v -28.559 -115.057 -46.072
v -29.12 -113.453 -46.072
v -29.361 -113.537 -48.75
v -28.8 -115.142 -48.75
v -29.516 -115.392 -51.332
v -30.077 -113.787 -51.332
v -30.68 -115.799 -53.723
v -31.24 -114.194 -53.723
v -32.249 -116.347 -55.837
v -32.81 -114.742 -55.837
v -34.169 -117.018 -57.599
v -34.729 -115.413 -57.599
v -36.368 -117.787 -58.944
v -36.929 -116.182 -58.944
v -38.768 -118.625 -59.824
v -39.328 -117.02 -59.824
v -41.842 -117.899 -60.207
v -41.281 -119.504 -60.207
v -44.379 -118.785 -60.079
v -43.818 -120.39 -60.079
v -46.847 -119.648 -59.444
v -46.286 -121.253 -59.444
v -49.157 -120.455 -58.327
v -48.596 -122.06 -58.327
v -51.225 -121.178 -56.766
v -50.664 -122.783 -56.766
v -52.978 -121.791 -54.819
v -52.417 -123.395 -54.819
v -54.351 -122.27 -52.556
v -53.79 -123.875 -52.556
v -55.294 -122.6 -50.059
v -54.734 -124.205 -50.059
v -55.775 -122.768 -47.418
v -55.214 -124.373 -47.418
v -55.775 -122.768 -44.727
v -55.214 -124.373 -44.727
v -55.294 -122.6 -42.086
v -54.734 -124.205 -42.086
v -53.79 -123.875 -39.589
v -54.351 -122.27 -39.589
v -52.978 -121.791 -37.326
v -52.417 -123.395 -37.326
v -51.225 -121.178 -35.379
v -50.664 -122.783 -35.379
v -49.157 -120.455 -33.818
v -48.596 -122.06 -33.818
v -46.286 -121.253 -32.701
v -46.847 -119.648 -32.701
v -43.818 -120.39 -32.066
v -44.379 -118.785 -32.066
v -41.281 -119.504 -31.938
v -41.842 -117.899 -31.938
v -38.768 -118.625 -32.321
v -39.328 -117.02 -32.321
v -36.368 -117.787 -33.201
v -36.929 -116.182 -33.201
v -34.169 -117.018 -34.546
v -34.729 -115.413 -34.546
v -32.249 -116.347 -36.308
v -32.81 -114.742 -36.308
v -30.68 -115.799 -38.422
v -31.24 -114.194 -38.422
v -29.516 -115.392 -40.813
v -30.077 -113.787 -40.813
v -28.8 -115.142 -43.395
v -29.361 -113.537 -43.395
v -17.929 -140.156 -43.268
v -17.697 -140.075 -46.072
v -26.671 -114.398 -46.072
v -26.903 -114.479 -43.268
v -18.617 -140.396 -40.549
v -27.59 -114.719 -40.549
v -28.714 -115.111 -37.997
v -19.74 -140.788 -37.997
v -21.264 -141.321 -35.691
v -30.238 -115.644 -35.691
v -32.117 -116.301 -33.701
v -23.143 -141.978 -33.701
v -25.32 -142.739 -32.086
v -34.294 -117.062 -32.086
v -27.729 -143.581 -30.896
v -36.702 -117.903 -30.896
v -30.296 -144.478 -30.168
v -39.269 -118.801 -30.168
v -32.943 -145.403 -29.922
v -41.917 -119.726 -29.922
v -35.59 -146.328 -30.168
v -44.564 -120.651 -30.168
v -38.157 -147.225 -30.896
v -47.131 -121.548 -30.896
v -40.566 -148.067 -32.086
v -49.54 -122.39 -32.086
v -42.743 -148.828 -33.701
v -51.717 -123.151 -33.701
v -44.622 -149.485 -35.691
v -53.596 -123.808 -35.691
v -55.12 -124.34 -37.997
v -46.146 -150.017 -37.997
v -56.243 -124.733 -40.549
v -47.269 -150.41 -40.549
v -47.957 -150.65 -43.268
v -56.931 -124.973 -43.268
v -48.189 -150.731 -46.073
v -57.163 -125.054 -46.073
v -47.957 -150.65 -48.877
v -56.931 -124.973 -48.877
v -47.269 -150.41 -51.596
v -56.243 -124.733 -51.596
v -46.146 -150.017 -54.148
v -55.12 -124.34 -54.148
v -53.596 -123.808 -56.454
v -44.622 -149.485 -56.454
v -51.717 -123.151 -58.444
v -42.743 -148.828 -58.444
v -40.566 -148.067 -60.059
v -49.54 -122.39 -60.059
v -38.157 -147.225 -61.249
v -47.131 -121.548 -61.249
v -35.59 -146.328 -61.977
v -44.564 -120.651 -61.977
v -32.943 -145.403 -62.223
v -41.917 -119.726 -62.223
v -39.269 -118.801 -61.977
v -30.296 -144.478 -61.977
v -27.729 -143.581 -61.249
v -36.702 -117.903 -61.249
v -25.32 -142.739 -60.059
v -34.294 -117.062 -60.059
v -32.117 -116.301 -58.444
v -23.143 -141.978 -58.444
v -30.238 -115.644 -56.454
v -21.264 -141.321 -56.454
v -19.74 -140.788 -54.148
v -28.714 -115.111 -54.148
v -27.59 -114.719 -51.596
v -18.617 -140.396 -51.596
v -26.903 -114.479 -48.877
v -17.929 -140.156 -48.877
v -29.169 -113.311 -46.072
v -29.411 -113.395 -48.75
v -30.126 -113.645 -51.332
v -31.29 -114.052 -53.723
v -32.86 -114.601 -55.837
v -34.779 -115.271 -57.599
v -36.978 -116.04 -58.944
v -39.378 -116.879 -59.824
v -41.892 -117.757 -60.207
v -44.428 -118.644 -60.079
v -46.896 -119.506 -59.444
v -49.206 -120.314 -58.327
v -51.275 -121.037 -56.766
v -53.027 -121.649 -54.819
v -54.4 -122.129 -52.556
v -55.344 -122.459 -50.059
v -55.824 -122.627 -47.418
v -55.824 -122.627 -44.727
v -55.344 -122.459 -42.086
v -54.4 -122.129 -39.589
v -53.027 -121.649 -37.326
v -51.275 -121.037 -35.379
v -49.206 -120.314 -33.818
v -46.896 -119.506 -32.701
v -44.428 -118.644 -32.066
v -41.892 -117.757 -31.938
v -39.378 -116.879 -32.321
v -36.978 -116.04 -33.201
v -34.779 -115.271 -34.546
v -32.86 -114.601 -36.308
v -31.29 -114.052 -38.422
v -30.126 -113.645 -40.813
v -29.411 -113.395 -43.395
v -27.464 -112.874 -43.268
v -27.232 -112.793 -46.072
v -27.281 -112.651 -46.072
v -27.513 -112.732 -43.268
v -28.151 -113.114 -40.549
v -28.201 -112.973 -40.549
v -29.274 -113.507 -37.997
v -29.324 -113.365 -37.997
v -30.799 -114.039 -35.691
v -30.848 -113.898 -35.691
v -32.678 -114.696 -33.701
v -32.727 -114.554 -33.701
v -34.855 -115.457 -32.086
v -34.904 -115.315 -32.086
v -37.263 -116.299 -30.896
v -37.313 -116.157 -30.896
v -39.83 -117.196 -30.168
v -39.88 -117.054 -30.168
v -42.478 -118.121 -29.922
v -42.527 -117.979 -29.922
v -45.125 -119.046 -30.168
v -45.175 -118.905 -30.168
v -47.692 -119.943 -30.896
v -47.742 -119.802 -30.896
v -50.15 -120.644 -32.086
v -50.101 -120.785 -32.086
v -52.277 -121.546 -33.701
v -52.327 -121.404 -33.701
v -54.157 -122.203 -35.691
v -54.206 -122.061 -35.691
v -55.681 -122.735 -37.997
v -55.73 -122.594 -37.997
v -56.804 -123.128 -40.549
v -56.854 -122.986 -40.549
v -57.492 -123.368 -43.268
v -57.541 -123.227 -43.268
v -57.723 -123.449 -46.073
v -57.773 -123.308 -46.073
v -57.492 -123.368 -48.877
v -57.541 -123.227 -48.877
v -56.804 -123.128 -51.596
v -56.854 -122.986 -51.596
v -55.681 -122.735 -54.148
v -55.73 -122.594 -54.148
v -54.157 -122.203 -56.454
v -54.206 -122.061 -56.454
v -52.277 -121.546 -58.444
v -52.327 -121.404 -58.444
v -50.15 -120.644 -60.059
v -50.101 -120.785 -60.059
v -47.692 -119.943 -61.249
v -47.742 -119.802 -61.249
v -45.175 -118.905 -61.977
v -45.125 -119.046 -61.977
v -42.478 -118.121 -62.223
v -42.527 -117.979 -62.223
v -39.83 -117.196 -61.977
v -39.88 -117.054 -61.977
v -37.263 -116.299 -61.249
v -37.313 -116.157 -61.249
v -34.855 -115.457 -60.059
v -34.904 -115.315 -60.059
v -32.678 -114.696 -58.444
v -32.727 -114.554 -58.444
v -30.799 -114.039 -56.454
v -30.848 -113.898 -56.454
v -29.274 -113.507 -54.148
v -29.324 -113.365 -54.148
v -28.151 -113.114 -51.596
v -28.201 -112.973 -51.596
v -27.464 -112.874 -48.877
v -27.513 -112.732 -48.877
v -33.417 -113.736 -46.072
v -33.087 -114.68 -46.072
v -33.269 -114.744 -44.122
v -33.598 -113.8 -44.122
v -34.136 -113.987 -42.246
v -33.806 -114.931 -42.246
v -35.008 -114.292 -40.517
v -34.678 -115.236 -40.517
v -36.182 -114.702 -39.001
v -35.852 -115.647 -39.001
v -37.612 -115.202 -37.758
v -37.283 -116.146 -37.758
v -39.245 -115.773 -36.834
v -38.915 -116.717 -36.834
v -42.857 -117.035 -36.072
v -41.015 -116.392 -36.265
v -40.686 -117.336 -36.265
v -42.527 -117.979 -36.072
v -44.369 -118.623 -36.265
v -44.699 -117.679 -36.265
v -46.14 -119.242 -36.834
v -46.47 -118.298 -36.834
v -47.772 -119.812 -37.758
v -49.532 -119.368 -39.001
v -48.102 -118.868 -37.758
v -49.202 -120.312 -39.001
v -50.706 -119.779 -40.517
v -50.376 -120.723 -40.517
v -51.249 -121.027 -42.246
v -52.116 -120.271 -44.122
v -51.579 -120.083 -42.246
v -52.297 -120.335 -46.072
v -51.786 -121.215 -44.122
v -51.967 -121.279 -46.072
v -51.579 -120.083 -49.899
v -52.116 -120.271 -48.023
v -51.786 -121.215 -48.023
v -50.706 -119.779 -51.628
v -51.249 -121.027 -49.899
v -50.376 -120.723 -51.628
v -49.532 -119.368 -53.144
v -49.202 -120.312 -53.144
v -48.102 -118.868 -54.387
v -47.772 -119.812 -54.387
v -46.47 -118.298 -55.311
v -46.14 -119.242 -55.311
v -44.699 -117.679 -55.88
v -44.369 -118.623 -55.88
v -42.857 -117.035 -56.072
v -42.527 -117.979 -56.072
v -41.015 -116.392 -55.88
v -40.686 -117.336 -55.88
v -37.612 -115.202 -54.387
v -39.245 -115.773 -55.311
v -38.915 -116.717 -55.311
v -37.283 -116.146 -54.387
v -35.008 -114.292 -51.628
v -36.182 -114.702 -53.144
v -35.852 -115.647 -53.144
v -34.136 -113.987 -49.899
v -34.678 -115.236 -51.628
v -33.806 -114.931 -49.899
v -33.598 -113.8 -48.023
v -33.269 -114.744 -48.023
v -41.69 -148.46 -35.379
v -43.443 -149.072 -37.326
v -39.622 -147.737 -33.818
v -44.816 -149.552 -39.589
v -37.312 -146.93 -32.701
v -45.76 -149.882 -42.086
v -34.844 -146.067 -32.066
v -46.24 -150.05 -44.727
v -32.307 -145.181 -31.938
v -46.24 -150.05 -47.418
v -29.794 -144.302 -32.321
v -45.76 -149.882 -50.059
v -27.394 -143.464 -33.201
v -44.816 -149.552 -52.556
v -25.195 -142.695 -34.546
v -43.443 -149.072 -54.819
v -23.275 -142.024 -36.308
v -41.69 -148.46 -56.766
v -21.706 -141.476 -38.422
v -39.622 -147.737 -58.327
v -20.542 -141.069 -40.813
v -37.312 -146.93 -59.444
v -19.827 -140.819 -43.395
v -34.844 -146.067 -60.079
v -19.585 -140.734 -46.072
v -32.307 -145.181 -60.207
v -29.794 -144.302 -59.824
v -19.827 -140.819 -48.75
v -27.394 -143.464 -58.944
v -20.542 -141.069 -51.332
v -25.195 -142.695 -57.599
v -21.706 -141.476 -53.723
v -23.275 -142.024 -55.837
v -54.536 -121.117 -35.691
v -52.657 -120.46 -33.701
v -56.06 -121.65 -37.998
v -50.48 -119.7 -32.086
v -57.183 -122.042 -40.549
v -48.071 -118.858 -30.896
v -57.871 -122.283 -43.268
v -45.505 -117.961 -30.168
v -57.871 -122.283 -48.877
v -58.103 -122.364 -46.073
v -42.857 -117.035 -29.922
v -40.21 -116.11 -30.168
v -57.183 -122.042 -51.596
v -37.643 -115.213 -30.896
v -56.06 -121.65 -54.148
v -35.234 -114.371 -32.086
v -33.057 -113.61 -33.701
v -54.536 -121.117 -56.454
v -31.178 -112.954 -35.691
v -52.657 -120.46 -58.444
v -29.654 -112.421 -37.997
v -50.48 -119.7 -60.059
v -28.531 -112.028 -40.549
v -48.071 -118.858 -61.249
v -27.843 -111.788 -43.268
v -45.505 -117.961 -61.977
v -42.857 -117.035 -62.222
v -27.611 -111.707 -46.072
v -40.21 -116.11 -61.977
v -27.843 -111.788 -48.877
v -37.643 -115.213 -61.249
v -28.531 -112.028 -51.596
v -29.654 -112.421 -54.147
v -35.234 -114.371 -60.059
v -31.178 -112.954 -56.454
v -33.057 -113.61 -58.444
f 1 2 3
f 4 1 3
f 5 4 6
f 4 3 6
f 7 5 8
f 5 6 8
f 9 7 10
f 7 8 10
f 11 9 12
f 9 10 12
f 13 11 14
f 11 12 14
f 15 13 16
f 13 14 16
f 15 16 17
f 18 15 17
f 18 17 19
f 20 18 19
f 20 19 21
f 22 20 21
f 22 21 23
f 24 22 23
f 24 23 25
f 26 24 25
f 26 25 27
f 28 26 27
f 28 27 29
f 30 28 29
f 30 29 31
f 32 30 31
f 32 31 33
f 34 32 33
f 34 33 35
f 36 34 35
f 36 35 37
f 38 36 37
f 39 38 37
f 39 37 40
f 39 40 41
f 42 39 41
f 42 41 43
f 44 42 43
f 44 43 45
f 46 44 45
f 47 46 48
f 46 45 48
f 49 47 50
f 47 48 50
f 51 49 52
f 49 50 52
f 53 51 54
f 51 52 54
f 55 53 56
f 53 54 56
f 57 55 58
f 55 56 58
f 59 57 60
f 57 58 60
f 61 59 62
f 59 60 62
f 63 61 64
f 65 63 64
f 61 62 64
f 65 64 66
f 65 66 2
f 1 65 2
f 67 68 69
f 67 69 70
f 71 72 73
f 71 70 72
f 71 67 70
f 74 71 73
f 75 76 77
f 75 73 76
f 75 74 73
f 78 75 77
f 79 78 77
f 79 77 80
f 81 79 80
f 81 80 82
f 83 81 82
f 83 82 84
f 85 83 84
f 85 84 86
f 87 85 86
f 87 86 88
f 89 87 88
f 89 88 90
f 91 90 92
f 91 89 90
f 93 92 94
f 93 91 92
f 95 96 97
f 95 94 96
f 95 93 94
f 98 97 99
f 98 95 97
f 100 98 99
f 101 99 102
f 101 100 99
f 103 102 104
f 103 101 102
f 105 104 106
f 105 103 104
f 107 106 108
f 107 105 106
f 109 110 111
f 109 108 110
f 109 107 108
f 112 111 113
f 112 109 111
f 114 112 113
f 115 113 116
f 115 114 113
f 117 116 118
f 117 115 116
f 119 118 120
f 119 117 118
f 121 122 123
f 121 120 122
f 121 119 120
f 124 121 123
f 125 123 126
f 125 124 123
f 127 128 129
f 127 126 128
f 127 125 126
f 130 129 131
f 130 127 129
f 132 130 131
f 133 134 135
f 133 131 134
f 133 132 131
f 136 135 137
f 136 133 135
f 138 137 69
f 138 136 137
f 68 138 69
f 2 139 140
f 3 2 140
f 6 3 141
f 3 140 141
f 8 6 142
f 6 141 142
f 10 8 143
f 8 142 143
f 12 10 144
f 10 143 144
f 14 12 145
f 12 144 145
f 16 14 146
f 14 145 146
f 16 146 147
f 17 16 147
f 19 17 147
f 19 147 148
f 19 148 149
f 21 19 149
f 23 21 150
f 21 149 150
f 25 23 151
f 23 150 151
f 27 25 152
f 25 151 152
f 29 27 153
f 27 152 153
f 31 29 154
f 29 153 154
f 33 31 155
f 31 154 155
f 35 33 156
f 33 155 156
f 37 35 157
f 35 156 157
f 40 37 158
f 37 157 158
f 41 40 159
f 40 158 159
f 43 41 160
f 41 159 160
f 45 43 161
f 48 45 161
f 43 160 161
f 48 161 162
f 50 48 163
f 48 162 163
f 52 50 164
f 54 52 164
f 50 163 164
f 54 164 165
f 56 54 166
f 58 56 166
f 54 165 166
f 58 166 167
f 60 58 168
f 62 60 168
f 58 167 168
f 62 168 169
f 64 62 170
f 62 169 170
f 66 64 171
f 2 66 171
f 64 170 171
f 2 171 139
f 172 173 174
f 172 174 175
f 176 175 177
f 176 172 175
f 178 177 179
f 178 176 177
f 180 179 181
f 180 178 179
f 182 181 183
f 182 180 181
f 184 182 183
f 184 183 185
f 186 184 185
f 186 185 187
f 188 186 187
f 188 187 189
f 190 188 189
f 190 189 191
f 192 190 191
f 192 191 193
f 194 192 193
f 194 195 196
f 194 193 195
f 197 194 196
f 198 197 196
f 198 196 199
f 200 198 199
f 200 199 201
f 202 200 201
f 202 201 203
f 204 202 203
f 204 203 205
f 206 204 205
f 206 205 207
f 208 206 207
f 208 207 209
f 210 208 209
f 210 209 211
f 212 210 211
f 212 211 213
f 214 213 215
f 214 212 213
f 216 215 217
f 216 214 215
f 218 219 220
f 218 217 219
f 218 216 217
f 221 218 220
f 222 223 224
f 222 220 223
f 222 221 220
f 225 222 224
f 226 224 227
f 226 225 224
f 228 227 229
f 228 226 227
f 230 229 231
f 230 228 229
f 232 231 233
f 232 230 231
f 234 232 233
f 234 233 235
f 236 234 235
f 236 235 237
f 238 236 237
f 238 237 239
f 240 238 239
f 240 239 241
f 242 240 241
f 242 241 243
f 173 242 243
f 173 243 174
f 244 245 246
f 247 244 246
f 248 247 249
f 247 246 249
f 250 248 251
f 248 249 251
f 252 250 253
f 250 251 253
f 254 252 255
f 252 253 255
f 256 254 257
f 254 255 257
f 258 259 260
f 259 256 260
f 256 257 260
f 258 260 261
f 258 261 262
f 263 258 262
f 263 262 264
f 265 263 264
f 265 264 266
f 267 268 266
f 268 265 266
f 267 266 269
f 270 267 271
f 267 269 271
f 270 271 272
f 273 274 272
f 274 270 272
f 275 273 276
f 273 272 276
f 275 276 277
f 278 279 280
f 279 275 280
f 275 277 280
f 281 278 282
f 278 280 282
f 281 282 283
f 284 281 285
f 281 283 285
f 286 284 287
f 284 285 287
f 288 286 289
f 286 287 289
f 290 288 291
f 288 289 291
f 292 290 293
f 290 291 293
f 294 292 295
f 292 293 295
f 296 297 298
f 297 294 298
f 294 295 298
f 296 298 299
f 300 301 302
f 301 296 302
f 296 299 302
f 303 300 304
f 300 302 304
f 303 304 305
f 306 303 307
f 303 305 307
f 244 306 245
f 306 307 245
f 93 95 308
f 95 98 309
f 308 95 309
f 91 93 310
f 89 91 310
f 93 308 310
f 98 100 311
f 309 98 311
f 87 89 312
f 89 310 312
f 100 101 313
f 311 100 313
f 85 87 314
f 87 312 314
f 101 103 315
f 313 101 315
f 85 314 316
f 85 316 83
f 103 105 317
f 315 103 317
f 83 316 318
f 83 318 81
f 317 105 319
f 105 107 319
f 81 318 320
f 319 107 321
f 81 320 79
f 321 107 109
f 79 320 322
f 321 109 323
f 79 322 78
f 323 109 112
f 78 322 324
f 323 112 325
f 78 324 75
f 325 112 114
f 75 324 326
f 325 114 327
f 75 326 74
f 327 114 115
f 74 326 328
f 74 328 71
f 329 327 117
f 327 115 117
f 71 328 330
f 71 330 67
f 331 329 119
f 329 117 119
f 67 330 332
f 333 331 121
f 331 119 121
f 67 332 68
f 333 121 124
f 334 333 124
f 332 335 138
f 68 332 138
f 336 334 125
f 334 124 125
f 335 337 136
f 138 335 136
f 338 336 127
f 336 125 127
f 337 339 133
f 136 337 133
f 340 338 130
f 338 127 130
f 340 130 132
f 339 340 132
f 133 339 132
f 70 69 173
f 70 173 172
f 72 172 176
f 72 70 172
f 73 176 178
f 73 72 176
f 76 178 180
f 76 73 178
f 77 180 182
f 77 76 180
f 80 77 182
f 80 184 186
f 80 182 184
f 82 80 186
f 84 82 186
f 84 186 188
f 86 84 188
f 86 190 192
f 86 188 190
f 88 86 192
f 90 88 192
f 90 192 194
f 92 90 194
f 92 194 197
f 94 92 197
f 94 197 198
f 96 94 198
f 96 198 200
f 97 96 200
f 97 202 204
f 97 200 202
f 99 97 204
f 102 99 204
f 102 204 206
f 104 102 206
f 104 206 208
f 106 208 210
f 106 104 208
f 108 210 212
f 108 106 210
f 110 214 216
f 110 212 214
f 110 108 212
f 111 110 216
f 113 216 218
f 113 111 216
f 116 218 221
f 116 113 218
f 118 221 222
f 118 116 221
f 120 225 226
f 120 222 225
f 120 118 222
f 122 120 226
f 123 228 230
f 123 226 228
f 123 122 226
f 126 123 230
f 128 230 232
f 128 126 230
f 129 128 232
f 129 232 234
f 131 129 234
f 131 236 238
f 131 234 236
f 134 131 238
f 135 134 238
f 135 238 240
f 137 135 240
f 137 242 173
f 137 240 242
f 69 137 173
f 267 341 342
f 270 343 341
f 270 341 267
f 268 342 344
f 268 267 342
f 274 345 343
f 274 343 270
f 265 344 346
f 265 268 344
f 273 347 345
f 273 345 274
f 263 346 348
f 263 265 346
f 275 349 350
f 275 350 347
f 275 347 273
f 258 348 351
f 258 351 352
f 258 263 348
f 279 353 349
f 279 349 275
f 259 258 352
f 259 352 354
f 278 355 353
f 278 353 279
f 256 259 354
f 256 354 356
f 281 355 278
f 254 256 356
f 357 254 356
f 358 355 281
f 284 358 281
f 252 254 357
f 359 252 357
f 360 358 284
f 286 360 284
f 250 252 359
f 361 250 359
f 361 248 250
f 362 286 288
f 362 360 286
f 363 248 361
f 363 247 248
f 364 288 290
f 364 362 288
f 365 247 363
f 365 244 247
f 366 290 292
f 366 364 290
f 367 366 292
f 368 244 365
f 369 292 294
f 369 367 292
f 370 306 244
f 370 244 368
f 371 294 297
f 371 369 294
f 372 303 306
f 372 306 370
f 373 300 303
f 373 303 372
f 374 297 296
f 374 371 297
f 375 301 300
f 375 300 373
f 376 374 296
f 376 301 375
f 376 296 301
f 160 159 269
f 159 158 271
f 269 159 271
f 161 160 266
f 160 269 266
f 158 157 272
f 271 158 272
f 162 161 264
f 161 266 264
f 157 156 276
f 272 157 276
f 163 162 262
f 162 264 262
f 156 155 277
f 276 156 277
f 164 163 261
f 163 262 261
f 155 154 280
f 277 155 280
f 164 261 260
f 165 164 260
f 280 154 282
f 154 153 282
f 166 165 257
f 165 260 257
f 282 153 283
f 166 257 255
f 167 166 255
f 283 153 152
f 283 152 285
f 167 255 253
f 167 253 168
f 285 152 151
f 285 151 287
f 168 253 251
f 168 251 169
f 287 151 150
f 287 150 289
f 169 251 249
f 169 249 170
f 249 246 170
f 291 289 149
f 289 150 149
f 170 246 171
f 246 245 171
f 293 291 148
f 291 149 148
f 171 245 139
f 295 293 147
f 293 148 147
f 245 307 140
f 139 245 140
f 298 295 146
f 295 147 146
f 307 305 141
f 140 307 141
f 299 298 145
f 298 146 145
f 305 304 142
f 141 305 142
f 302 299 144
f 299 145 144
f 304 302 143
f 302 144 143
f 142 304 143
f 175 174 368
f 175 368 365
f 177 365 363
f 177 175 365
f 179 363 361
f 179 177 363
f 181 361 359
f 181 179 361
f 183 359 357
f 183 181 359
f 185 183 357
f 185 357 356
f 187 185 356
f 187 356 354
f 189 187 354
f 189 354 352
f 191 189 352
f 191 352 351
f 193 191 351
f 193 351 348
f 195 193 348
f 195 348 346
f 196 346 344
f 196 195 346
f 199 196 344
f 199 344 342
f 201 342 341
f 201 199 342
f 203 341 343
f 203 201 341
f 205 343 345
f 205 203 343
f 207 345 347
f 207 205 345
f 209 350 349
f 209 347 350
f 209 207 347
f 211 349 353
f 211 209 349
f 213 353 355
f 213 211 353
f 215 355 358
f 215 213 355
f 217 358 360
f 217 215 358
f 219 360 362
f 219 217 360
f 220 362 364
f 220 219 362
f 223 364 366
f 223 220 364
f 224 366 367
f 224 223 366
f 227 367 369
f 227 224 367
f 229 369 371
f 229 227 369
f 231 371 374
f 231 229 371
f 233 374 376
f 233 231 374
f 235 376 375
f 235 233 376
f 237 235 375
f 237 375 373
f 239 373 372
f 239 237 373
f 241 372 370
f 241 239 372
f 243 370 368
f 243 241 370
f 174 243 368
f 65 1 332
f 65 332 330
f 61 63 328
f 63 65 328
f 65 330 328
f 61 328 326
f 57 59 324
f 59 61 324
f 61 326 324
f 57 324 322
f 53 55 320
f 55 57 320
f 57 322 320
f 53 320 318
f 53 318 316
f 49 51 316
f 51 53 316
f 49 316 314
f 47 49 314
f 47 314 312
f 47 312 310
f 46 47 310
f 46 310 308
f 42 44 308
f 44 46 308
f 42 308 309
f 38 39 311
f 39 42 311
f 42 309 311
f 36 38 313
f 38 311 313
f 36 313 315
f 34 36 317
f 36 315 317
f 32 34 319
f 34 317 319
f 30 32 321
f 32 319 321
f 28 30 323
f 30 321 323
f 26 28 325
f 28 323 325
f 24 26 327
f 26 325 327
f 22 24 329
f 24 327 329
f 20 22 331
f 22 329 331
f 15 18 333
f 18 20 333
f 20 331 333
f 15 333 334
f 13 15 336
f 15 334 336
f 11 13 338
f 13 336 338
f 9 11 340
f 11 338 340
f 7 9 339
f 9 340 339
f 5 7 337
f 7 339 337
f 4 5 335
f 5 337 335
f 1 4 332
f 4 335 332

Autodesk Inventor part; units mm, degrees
ref_plane "YZ Plane" through (0, 0, 0) normal (1, 0, 0) x (0, 1, 0)
ref_plane "XZ Plane" through (0, 0, 0) normal (0, 1, 0) x (-1, 0, 0)
ref_plane "XY Plane" through (0, 0, 0) normal (0, 0, 1) x (1, 0, 0)
ref_plane "Work Plane2" through (-89.4914, 16.4002, -46.0725) normal (0, 0, 1) x (0.3299211, -0.9440085, 0)
sketch "Sketch3" plane through (-89.4914, 16.4002, -46.0725) normal (0, 0, 1) x (0.3299211, -0.9440085, 0)
  line L0 (142.5, 12.3) -> (142.5, -12.3) projected
  line L1 (142.35, 11.9681) -> (142.35, -12.4873)
  point P0 (45.0071, 79.0699)
  dimension "d3" = 0.15
sketch "Sketch2" plane through (-89.4914, 16.4002, -46.0725) normal (0, 0, 1) x (0.3299211, -0.9440085, 0)
  line L0 (144.2, -14) -> (171.4, -14)
  line L1 (142.5, -12.3) -> (142.5, 11.0344) projected
  line L2 (130, 22) -> (130, -22) projected
  line L3 (144.2, 16.15) -> (171.4, 16.15)
  line L4 (171.4, 16.15) -> (171.4, 14.15)
  line L5 (144.2, 14.15) -> (171.4, 14.15)
  line L6 (156.1685, 0) -> (84.745, 0) construction
  line L7 (144.2, 14.15) -> (142.35, 14.15)
  line L8 (142.35, 16.15) -> (144.2, 16.15)
  line L9 (142.35, 11.9681) -> (142.35, -12.4873) projected
  line L10 (142.5, 14.15) -> (142.35, 14.15)
  line L11 (142.35, 14.15) -> (142.35, 16.15)
  line L12 (142.35, 16.15) -> (142.5, 16.15)
  point P0 (45.0071, 79.0699)
  dimension "d7" = 2
revolve "Revolution1" add sketch "Sketch2" angle 360 about axis through (-37.9682, -131.0241, -46.0725) along (-0.3299211, 0.9440085, 0)
sketch "Sketch4" plane through (-42.5272, -117.9794, -46.0725) normal (-0.3299211, 0.9440085, 0) x (0.9440085, 0.3299211, 0)
  circle A0 centre (0, 0) radius 10
  circle A1 centre (0, 0) radius 16.15
  point P0 (79.0699, -46.0725)
  dimension "d4" = 20
extrude "Extrusion2" add sketch "Sketch4" along normal blind 1
properties part number "motor_handler"
